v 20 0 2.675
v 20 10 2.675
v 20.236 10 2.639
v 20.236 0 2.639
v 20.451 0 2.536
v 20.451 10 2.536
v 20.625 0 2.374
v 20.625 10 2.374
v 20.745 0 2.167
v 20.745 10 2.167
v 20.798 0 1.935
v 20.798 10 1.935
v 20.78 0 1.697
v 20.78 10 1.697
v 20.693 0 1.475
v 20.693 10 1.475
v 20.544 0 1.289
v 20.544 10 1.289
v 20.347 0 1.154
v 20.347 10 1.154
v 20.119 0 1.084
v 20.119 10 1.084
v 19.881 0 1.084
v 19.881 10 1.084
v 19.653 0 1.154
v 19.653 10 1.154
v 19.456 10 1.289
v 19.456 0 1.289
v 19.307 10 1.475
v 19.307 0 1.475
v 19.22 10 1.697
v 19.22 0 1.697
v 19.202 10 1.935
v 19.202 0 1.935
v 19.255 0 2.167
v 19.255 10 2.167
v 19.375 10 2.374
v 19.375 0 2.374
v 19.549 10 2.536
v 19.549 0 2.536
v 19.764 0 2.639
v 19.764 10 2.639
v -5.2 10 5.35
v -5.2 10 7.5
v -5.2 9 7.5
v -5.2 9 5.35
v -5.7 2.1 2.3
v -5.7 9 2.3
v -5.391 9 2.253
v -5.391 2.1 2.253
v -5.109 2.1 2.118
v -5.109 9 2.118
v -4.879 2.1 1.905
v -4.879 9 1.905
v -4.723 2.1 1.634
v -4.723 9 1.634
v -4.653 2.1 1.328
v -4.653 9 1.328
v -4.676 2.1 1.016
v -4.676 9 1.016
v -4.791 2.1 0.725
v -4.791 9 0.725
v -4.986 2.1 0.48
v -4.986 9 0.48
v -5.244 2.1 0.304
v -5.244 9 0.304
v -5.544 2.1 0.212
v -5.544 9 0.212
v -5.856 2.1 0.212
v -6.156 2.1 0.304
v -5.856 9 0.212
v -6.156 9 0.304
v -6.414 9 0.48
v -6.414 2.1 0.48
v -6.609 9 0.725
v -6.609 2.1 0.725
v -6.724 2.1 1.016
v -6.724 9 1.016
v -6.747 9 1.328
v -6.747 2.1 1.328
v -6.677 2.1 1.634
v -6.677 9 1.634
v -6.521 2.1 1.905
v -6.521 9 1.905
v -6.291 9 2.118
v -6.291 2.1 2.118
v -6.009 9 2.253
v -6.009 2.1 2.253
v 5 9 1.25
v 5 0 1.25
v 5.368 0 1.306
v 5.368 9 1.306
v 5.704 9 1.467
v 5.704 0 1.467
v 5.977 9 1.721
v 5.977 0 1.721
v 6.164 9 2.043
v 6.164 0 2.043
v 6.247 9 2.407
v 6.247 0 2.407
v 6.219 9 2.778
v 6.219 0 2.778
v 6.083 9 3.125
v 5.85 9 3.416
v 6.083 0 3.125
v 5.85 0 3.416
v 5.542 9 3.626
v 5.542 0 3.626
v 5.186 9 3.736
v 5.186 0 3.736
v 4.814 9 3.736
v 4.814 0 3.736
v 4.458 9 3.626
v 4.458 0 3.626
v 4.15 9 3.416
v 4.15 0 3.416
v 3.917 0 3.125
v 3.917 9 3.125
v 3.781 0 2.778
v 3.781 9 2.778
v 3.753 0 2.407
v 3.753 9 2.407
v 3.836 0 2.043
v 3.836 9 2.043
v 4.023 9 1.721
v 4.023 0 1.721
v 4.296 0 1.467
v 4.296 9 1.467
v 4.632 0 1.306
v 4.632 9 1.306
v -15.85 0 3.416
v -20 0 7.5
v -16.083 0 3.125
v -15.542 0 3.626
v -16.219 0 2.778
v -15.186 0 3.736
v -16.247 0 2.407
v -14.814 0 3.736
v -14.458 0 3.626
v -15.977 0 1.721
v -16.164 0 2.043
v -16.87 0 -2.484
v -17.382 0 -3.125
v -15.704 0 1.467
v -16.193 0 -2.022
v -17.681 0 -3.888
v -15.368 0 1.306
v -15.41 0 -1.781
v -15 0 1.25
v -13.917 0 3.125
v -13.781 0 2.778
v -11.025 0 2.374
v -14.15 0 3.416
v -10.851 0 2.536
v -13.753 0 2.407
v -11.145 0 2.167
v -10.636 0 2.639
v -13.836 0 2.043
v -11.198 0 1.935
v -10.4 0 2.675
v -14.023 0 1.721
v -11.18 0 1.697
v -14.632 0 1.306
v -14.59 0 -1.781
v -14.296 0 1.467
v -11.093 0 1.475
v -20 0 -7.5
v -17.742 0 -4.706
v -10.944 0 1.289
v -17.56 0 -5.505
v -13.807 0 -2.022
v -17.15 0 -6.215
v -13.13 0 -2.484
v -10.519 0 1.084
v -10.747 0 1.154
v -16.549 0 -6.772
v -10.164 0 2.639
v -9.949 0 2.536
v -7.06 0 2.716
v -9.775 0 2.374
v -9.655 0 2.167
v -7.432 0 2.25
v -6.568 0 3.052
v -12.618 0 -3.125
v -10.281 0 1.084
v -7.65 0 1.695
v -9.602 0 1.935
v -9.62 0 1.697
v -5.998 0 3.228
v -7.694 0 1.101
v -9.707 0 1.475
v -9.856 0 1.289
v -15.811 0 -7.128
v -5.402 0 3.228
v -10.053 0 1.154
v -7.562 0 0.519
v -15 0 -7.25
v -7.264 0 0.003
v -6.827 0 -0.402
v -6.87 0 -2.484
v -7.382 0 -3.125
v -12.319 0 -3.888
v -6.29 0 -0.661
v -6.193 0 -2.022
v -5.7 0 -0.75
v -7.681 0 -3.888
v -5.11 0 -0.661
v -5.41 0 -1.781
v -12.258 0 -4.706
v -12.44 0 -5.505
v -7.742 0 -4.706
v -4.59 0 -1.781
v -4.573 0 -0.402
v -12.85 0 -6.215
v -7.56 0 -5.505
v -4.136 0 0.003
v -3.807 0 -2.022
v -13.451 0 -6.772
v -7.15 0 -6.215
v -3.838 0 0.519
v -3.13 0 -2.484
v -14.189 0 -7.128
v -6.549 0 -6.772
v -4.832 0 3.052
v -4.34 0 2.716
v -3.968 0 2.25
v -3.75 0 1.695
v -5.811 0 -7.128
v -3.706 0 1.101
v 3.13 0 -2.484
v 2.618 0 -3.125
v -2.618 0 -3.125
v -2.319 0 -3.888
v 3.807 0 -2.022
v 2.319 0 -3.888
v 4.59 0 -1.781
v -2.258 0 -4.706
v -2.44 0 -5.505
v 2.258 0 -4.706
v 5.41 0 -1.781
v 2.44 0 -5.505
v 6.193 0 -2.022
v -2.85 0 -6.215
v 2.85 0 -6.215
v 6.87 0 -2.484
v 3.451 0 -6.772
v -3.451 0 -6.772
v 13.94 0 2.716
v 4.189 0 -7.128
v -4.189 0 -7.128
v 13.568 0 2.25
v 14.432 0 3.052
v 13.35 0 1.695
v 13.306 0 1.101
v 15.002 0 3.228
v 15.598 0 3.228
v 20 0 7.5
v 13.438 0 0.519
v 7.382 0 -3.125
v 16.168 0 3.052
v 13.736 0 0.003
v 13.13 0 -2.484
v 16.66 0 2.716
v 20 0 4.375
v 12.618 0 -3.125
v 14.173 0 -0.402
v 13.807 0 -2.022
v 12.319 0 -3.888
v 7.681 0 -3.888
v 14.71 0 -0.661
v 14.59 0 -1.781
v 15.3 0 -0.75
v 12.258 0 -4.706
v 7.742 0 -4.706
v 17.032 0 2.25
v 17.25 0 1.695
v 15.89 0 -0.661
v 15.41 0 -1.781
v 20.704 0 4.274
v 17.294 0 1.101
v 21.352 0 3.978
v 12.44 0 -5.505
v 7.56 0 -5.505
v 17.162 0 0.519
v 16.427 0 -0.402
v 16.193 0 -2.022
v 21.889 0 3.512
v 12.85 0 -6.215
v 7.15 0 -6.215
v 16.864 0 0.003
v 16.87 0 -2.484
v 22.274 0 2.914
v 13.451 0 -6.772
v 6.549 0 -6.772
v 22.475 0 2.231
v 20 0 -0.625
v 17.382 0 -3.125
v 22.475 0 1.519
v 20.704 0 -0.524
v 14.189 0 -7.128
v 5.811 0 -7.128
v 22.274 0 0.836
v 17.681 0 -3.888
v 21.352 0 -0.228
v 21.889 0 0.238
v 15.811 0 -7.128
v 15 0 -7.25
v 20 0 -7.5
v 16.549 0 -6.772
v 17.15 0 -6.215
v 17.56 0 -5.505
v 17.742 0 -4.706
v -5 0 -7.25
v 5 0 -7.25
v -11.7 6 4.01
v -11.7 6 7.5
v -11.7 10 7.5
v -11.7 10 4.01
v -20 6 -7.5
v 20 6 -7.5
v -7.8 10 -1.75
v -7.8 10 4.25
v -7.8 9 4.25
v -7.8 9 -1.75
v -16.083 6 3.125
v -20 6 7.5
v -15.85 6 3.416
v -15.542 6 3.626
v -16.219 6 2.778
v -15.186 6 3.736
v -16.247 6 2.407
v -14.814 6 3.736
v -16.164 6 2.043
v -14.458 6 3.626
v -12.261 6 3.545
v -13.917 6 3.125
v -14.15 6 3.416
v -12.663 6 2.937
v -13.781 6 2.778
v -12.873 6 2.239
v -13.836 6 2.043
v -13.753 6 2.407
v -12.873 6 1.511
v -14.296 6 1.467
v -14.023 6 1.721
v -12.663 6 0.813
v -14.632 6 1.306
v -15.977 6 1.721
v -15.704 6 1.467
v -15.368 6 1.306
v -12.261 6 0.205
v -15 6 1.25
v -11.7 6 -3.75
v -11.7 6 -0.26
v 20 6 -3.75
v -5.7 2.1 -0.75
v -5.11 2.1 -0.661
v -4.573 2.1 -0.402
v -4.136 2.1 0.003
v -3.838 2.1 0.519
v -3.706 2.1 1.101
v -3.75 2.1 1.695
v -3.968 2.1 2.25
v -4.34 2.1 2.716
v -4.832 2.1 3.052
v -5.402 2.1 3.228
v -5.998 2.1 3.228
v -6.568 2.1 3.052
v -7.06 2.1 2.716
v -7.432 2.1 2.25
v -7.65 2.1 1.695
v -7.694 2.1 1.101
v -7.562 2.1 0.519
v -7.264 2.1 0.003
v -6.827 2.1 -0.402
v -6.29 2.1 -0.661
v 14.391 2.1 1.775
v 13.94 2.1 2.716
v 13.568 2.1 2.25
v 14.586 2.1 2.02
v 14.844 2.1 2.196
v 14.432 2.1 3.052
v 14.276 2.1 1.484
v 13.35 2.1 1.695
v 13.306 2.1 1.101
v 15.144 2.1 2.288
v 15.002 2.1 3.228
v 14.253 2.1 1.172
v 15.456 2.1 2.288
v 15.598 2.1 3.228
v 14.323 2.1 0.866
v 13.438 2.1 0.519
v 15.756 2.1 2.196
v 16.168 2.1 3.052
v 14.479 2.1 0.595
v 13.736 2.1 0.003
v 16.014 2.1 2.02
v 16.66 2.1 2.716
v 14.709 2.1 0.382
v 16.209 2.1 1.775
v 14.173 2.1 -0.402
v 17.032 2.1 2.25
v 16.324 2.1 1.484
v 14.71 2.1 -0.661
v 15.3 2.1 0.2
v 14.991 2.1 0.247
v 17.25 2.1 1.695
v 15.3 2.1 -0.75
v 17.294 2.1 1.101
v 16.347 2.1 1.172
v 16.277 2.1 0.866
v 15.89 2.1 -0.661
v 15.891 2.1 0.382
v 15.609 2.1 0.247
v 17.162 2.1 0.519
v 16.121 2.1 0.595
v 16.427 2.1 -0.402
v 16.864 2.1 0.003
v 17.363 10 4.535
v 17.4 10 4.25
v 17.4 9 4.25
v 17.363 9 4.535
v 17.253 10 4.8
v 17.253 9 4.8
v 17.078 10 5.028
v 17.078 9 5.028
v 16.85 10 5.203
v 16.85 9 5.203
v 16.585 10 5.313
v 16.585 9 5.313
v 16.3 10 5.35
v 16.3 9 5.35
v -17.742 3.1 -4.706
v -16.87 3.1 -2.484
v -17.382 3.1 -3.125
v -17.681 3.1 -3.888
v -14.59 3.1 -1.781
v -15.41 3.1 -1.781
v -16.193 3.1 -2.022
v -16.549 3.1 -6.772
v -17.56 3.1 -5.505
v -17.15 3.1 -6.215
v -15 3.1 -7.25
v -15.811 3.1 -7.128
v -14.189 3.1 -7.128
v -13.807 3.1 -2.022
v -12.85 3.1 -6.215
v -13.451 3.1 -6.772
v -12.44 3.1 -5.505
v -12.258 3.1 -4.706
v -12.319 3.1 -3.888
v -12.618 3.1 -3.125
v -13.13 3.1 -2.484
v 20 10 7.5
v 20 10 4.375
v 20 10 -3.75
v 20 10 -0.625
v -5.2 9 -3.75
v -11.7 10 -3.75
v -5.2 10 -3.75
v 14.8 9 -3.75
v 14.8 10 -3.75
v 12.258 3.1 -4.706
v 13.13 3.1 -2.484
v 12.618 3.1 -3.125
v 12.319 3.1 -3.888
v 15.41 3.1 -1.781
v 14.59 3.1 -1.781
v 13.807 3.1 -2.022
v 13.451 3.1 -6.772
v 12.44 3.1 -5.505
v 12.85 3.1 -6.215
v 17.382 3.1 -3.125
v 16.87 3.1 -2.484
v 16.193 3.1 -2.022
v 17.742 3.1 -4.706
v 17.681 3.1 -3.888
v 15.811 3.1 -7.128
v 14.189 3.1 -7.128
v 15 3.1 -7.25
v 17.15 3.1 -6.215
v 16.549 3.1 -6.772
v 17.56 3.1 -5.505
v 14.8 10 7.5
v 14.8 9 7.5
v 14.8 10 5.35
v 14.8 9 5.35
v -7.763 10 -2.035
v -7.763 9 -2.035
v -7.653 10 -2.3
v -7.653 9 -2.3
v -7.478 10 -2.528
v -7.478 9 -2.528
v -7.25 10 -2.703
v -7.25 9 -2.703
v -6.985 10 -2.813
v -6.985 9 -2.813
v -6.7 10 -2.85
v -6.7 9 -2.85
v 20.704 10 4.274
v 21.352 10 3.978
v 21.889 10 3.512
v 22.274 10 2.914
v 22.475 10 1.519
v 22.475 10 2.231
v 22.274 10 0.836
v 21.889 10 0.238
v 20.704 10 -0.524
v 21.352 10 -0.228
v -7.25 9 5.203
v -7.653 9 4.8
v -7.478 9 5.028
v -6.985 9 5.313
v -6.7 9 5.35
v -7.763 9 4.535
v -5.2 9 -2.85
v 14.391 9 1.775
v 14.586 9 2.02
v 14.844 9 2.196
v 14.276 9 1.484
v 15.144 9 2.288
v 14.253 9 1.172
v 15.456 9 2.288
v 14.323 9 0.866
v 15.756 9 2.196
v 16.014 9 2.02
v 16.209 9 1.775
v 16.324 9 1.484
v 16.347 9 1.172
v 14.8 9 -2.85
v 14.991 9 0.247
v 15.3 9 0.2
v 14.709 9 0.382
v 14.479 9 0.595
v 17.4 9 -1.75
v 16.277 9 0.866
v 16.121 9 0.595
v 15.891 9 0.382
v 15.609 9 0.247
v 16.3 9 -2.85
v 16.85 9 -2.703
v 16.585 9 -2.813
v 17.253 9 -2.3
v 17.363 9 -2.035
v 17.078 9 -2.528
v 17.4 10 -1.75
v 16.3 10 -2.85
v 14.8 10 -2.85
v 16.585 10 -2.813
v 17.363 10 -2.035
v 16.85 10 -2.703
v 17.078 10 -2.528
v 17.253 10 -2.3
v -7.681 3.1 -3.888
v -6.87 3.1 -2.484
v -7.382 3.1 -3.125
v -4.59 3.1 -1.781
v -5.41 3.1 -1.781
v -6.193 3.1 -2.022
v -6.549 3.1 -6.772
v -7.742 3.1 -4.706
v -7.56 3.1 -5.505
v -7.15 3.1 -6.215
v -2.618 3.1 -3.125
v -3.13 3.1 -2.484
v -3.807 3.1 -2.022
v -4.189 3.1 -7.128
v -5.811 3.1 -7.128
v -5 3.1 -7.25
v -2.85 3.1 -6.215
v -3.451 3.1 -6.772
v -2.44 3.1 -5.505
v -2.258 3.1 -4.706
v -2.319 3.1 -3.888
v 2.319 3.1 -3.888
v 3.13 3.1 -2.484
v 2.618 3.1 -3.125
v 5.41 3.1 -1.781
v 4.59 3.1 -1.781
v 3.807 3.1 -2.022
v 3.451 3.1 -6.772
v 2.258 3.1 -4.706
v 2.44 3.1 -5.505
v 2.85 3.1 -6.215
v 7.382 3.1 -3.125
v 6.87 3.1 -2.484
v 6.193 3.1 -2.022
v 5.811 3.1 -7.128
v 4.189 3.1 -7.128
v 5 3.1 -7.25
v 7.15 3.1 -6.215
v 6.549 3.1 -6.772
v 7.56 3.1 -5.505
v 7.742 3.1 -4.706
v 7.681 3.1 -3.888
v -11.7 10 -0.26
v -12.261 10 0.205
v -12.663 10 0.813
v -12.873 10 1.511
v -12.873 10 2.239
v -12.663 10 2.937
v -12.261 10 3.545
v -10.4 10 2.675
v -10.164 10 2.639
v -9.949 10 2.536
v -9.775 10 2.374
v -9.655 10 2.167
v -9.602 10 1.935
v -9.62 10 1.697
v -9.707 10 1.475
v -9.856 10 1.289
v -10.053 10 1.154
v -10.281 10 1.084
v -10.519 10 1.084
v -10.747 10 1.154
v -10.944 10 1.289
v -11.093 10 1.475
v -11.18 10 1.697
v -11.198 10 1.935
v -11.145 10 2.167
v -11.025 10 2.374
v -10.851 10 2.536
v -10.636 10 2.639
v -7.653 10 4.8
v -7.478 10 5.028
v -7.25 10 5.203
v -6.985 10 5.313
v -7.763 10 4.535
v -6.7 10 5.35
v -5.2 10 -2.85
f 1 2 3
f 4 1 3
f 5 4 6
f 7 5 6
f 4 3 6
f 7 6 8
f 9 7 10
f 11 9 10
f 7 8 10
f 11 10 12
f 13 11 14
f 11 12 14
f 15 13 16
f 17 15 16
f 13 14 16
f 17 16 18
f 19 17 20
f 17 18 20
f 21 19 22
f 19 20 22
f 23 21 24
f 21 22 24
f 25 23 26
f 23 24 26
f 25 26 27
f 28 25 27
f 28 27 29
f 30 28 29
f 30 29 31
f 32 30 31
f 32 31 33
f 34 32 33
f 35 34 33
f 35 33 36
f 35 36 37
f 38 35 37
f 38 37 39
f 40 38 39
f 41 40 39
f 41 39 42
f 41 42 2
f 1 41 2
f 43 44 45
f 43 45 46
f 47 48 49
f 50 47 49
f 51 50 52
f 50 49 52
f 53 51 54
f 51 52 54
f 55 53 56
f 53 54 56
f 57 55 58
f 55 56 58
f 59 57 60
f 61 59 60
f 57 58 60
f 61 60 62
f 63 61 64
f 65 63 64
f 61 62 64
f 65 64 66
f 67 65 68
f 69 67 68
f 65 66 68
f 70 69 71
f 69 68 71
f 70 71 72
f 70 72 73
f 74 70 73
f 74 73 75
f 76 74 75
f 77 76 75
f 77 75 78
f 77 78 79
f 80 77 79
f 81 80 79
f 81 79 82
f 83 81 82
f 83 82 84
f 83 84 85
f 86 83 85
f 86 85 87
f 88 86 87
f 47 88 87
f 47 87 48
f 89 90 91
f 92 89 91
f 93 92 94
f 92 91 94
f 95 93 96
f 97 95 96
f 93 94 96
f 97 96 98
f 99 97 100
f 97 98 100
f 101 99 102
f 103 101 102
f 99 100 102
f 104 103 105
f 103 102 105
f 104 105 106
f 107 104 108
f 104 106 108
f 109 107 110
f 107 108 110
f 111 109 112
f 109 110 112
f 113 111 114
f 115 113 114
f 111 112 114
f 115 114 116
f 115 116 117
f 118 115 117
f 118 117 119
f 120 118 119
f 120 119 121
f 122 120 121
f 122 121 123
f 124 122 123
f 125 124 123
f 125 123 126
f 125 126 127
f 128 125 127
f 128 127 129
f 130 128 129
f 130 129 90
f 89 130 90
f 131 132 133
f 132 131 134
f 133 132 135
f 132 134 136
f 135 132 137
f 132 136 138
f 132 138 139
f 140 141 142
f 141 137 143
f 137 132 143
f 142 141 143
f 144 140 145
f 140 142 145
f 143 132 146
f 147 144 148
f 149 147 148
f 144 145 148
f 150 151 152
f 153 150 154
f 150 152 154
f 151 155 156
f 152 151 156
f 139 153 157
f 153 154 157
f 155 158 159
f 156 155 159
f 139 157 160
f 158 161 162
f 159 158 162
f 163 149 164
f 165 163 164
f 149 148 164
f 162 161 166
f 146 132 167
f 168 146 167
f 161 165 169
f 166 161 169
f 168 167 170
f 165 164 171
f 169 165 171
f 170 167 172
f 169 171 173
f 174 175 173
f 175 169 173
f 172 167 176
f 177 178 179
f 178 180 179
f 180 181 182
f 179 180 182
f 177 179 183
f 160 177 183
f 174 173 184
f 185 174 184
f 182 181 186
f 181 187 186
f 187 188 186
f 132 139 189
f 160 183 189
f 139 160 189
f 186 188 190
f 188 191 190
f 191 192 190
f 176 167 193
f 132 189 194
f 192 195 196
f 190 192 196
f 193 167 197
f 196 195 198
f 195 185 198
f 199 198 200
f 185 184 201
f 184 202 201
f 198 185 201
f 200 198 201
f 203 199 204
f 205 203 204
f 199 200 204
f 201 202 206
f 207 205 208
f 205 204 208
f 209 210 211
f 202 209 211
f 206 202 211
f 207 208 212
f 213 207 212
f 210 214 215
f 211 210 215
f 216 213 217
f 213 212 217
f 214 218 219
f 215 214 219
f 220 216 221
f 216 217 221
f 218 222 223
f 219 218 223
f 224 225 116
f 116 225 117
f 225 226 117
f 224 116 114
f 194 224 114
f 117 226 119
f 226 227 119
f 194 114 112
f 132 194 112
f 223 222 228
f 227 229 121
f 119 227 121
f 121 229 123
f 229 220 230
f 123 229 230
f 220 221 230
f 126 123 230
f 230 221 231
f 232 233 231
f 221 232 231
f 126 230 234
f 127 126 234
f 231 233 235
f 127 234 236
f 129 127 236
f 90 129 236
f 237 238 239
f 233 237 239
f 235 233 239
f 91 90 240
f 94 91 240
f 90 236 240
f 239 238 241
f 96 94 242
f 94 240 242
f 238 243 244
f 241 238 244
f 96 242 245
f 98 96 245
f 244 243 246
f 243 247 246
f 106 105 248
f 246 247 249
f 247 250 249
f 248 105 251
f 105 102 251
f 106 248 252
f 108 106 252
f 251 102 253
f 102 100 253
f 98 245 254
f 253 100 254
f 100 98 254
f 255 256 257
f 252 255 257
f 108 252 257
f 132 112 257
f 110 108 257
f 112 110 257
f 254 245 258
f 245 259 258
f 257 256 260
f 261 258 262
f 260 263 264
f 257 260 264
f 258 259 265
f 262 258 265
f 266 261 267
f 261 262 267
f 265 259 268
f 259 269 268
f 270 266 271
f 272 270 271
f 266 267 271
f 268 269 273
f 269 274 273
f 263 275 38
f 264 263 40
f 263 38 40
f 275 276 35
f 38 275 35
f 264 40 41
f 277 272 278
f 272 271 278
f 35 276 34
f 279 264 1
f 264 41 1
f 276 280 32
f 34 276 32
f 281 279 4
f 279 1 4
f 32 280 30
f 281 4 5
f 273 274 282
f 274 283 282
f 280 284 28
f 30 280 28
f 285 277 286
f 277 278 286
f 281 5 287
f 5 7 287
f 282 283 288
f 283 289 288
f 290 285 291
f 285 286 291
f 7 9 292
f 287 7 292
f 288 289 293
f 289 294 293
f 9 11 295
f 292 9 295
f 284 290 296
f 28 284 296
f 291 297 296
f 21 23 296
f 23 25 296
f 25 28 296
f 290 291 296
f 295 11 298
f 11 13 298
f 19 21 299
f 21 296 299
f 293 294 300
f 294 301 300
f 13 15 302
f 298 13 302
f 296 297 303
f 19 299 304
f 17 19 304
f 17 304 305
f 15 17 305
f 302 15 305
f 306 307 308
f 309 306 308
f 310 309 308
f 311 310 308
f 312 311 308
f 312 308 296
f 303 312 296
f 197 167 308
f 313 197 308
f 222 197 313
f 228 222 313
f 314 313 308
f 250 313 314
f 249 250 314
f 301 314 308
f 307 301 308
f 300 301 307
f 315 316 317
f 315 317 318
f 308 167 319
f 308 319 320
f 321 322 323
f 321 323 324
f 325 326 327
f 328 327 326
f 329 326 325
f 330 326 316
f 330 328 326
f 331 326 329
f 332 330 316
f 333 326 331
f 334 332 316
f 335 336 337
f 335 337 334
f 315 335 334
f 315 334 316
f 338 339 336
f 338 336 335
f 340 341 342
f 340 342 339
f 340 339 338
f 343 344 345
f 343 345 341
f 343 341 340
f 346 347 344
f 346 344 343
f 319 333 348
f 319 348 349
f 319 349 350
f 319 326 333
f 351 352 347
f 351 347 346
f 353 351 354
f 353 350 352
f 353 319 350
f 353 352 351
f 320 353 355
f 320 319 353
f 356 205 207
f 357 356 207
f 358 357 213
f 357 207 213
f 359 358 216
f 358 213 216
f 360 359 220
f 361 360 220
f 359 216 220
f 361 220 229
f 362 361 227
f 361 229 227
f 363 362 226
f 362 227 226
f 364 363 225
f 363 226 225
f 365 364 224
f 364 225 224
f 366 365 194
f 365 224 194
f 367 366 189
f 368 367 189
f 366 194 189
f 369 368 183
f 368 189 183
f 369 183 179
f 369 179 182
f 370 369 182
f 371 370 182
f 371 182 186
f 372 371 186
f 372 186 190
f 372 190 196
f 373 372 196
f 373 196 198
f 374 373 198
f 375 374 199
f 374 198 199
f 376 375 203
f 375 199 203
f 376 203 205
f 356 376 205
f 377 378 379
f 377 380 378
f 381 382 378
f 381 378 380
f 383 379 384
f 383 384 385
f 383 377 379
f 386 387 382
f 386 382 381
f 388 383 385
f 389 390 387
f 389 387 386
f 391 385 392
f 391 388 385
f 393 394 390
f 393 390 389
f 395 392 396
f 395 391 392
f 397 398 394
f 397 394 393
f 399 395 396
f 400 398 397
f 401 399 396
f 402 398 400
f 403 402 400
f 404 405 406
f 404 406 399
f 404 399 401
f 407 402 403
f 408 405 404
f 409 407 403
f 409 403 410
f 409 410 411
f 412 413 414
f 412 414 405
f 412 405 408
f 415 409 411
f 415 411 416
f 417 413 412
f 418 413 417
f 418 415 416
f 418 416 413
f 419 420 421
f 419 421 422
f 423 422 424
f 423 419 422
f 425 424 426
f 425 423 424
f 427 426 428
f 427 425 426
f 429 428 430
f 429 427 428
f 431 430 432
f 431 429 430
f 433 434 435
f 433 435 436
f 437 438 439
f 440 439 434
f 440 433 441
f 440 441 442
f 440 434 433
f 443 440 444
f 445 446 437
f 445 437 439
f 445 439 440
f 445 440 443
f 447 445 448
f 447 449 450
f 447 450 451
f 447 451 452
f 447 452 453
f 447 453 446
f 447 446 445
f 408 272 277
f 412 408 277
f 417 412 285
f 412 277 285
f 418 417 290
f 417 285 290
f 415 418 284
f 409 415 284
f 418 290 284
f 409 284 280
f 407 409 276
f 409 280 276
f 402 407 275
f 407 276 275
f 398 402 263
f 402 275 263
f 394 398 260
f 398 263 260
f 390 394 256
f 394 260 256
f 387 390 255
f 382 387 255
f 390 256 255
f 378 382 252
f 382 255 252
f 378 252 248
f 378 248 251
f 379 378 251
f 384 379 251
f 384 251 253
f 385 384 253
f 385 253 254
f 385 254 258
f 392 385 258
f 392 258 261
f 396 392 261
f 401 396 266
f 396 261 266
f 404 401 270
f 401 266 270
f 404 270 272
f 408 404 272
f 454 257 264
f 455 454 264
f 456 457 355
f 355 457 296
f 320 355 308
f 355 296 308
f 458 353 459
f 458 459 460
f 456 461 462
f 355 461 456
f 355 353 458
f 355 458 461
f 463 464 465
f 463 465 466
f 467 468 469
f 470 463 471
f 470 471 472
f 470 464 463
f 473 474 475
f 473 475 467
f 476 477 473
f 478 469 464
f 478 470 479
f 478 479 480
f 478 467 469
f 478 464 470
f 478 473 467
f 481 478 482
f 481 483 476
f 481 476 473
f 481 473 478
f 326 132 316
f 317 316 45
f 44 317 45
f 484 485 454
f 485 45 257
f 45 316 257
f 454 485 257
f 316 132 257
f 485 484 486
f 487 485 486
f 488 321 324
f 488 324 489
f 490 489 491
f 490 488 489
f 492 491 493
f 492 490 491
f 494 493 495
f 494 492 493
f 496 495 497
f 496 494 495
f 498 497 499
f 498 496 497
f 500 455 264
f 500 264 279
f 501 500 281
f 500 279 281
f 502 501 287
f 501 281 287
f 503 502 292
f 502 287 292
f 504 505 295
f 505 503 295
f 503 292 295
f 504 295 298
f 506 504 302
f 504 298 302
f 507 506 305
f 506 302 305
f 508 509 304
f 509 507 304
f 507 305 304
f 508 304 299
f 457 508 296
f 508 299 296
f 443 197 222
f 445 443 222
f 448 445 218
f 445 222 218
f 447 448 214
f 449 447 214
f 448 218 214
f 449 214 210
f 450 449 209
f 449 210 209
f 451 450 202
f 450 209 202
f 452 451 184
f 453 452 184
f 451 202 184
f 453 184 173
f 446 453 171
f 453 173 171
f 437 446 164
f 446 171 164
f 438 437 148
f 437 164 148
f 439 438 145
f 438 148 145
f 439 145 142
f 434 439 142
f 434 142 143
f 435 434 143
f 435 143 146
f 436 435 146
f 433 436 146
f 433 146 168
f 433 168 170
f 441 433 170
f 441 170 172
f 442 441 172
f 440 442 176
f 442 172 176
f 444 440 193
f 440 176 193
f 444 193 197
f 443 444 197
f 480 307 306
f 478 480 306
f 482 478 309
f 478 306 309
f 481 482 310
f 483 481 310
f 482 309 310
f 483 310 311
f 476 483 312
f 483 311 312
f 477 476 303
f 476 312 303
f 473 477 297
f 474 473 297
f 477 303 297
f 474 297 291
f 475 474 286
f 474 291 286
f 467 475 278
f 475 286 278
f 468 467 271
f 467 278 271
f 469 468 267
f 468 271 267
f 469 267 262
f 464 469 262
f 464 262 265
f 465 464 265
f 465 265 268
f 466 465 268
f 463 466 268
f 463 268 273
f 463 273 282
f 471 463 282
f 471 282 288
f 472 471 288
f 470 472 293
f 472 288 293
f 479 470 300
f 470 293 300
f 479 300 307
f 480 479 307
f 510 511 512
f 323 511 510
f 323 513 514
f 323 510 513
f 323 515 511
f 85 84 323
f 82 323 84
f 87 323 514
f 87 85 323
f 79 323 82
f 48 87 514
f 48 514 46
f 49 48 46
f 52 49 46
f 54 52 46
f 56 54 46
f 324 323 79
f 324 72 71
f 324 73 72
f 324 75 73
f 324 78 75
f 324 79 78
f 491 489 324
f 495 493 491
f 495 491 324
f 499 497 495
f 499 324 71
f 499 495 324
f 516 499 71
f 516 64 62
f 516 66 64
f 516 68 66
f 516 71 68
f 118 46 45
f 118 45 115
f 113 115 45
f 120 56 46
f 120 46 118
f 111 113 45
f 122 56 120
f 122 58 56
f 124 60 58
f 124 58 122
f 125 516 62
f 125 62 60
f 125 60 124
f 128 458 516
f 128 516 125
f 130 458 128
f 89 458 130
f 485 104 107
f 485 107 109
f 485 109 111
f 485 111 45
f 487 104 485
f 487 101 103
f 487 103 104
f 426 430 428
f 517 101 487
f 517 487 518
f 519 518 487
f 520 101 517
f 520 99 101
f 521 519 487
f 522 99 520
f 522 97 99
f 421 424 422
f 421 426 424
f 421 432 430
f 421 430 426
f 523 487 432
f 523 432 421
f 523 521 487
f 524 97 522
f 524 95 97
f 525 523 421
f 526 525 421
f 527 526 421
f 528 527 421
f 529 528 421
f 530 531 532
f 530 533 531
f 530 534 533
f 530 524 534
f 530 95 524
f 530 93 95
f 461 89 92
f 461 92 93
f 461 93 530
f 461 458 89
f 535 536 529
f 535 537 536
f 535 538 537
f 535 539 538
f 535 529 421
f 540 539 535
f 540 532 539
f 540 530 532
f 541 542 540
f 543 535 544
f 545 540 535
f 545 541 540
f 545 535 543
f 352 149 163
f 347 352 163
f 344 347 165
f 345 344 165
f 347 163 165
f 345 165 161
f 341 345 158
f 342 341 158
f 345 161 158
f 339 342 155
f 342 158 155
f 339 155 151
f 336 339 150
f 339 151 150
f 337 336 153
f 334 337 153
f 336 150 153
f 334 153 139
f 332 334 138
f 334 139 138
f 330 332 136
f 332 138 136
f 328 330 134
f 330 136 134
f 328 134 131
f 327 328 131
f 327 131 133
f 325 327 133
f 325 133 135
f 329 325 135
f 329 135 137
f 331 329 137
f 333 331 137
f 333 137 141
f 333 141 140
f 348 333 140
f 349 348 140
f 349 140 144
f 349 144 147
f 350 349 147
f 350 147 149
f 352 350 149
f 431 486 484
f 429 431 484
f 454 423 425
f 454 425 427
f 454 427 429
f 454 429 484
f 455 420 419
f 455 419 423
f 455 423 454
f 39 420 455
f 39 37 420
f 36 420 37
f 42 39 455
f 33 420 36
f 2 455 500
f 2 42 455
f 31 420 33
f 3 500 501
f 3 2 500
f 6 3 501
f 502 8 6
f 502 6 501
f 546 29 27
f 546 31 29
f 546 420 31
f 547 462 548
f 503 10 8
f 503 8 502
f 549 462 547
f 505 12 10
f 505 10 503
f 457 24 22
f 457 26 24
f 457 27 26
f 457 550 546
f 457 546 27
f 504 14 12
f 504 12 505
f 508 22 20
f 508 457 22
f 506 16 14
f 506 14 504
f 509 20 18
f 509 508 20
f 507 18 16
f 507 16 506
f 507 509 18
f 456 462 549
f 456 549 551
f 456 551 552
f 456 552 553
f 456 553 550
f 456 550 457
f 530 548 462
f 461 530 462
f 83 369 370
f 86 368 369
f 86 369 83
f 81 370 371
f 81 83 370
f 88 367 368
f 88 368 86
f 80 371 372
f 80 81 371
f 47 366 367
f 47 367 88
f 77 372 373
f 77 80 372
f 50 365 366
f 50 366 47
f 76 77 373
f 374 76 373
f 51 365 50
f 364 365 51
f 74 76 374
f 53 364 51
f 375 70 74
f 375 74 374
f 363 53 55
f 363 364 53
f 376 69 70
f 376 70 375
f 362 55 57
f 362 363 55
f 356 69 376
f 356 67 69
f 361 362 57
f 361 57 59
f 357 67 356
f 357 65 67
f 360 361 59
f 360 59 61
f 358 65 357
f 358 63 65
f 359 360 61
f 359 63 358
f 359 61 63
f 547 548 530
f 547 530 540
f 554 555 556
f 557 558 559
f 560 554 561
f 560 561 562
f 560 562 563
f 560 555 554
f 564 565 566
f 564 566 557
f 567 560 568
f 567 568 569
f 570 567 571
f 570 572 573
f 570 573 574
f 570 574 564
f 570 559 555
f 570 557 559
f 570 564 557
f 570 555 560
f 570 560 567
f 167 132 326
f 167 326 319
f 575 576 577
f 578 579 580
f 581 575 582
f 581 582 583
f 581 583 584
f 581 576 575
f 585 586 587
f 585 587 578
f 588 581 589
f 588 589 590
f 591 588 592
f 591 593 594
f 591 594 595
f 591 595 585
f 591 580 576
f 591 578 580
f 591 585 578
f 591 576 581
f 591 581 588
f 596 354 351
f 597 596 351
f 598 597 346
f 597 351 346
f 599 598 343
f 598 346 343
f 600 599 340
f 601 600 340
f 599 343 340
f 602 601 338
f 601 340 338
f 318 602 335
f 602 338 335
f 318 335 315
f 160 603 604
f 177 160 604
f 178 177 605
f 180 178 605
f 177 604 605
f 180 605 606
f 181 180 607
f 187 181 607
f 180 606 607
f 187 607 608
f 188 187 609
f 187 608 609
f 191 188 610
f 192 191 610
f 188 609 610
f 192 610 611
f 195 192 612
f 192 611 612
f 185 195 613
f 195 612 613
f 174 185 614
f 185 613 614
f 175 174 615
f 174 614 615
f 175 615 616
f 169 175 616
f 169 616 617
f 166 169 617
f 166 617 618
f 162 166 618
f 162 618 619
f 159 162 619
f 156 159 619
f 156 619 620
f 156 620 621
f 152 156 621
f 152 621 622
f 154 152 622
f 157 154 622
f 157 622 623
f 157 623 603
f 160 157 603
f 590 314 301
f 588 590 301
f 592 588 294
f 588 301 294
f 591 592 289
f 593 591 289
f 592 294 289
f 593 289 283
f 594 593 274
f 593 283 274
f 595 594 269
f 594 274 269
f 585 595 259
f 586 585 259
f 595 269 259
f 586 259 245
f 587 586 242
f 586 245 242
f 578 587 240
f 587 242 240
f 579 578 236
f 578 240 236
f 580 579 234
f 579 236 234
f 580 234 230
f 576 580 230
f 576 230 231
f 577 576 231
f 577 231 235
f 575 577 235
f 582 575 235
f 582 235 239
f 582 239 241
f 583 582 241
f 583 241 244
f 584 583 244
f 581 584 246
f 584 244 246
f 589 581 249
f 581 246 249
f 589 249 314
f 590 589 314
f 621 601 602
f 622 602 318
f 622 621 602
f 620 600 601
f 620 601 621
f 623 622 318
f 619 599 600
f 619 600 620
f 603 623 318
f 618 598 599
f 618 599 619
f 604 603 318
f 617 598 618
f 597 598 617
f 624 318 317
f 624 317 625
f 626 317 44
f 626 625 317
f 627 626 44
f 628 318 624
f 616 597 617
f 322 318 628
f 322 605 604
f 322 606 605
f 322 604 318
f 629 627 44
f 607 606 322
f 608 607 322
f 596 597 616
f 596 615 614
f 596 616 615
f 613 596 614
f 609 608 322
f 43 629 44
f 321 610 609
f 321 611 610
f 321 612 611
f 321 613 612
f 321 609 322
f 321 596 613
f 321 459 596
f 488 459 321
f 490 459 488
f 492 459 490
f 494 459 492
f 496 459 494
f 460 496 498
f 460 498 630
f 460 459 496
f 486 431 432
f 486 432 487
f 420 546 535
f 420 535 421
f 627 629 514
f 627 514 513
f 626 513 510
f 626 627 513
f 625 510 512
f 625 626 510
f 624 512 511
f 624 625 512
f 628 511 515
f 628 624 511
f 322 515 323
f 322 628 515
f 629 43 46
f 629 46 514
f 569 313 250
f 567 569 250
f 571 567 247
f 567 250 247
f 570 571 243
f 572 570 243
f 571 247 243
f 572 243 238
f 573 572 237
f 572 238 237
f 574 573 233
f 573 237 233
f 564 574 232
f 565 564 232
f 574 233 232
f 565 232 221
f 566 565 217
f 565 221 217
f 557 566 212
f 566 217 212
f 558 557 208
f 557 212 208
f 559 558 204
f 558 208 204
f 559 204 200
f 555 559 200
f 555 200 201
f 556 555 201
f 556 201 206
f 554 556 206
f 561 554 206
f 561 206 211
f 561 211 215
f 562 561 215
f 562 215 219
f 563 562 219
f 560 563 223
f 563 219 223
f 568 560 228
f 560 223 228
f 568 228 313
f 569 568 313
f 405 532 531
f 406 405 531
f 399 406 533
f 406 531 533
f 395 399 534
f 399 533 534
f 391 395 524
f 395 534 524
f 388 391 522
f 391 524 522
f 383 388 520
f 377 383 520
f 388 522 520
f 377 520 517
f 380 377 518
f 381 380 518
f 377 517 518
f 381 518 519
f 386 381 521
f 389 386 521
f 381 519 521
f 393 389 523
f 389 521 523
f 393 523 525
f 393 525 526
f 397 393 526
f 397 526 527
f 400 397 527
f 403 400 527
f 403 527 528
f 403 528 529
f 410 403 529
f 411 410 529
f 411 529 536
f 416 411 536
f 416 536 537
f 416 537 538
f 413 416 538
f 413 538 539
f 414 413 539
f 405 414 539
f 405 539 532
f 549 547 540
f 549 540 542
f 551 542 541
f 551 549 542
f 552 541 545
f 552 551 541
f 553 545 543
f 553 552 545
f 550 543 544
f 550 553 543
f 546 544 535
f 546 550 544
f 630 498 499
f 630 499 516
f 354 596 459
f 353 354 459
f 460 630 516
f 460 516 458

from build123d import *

# Parameters (mm, degrees)
SKETCH_1_W          = 40
SKETCH_1_H          = 15
EXTRUDE_1_DEPTH     = 6
SKETCH_2_W          = 31.7
SKETCH_2_H          = 11.25
EXTRUDE_2_DEPTH     = 4
EXTRUDE_3_DEPTH     = 3
SKETCH_4_W          = 20
SKETCH_4_H          = 1
SKETCH_4_H_2        = 2.25
CUT_EXTRUDE_1_DEPTH = 1
SKETCH_6_R          = 1.05
CUT_EXTRUDE_2_DEPTH = 24.178653973
SKETCH_7_R          = 2
CUT_EXTRUDE_3_DEPTH = 2.1
SKETCH_8_R          = 1.25
CUT_EXTRUDE_4_DEPTH = 24.58495283
SKETCH_9_R          = 2.5
EXTRUDE_4_DEPTH     = 10
SKETCH_10_R         = 0.8
CUT_EXTRUDE_5_DEPTH = 26.739075352
CUT_EXTRUDE_6_DEPTH = 1
SKETCH_13_R         = 2.75
CUT_EXTRUDE_8_DEPTH = 3.1


with BuildPart() as part:
    # 草图1 → 凸台-拉伸1 (new body)
    with BuildSketch(Plane(origin=(0, 0, 0), x_dir=(1, 0, 0), z_dir=(0, 1, 0))):
        Rectangle(SKETCH_1_W, SKETCH_1_H)
    extrude(amount=EXTRUDE_1_DEPTH)

    # 草图2 → 凸台-拉伸2 (add)
    with BuildSketch(Plane(origin=(0, 6, 0), x_dir=(1, 0, 0), z_dir=(0, 1, 0))):
        with Locations((4.15, -1.875)):
            Rectangle(SKETCH_2_W, SKETCH_2_H)
        with BuildLine():
            Line((-6.7, 2.75), (16.3, 2.75))
            ThreePointArc((16.3, 2.75), (17.007106781, 2.457106781), (17.3, 1.75))
            Line((17.3, 1.75), (17.3, -4.25))
            ThreePointArc((17.3, -4.25), (17.007106781, -4.957106781), (16.3, -5.25))
            Line((16.3, -5.25), (-6.7, -5.25))
            ThreePointArc((-6.7, -5.25), (-7.407106781, -4.957106781), (-7.7, -4.25))
            Line((-7.7, -4.25), (-7.7, 1.75))
            ThreePointArc((-7.7, 1.75), (-7.407106781, 2.457106781), (-6.7, 2.75))
        make_face(mode=Mode.SUBTRACT)
    extrude(amount=EXTRUDE_2_DEPTH)

    # 草图3 → 凸台-拉伸3 (add)
    with BuildSketch(Plane(origin=(0, 6, 0), x_dir=(1, 0, 0), z_dir=(0, 1, 0))):
        with BuildLine():
            Line((-6.7, -5.25), (16.3, -5.25))
            ThreePointArc((16.3, -5.25), (17.007106781, -4.957106781), (17.3, -4.25))
            Line((17.3, -4.25), (17.3, 1.75))
            ThreePointArc((17.3, 1.75), (17.007106781, 2.457106781), (16.3, 2.75))
            Line((16.3, 2.75), (-6.7, 2.75))
            ThreePointArc((-6.7, 2.75), (-7.407106781, 2.457106781), (-7.7, 1.75))
            Line((-7.7, 1.75), (-7.7, -4.25))
            ThreePointArc((-7.7, -4.25), (-7.407106781, -4.957106781), (-6.7, -5.25))
        make_face()
    extrude(amount=EXTRUDE_3_DEPTH)

    # 草图4 → 切除-拉伸1 (cut)
    with BuildSketch(Plane(origin=(0, 10, 0), x_dir=(1, 0, 0), z_dir=(0, 1, 0))):
        with Locations((4.8, 3.25)):
            Rectangle(SKETCH_4_W, SKETCH_4_H)
        with Locations((4.8, -6.375)):
            Rectangle(SKETCH_4_W, SKETCH_4_H_2)
    extrude(amount=-CUT_EXTRUDE_1_DEPTH, mode=Mode.SUBTRACT)

    # 草图6 → 切除-拉伸2 (cut, through all)
    with BuildSketch(Plane(origin=(0, 9, 0), x_dir=(1, 0, 0), z_dir=(0, 1, 0))):
        with Locations(Location((-5.7, -1.25, 0), (0, 0, 270))):
            Circle(SKETCH_6_R)
        with Locations(Location((15.3, -1.25, 0), (0, 0, 90))):
            Circle(SKETCH_6_R)
    extrude(amount=-CUT_EXTRUDE_2_DEPTH, mode=Mode.SUBTRACT)

    # 草图7 → 切除-拉伸3 (cut)
    with BuildSketch(Plane.XZ):
        with Locations(Location((-5.7, 1.25, 0), (0, 0, 270))):
            Circle(SKETCH_7_R)
        with Locations(Location((15.3, 1.25, 0), (0, 0, 270))):
            Circle(SKETCH_7_R)
    extrude(amount=-CUT_EXTRUDE_3_DEPTH, mode=Mode.SUBTRACT)

    # 草图8 → 切除-拉伸4 (cut, through all)
    with BuildSketch(Plane.XZ):
        with Locations(Location((-15, 2.5, 0), (0, 0, 270))):
            Circle(SKETCH_8_R)
        with Locations(Location((5, 2.5, 0), (0, 0, 270))):
            Circle(SKETCH_8_R)
    extrude(amount=-CUT_EXTRUDE_4_DEPTH, mode=Mode.SUBTRACT)

    # 草图9 → 凸台-拉伸4 (add)
    with BuildSketch(Plane(origin=(0, 0, 0), x_dir=(1, 0, 0), z_dir=(0, 1, 0))):
        with Locations((20, -1.875)):
            Circle(SKETCH_9_R)
        with Locations((-10.4, -1.875)):
            Circle(SKETCH_9_R)
    extrude(amount=EXTRUDE_4_DEPTH)

    # 草图10 → 切除-拉伸5 (cut, through all)
    with BuildSketch(Plane(origin=(0, 10, 0), x_dir=(1, 0, 0), z_dir=(0, 1, 0))):
        with Locations(Location((-10.4, -1.875, 0), (0, 0, 270))):
            Circle(SKETCH_10_R)
        with Locations(Location((20, -1.875, 0), (0, 0, 270))):
            Circle(SKETCH_10_R)
    extrude(amount=-CUT_EXTRUDE_5_DEPTH, mode=Mode.SUBTRACT)

    # 草图11 → 切除-拉伸6 (cut)
    with BuildSketch(Plane(origin=(0, 10, 0), x_dir=(1, 0, 0), z_dir=(0, 1, 0))):
        with BuildLine():
            Line((17.4, 1.75), (17.4, -4.25))
            ThreePointArc((17.4, -4.25), (17.077817459, -5.027817459), (16.3, -5.35))
            Line((16.3, -5.35), (-6.7, -5.35))
            ThreePointArc((-6.7, -5.35), (-7.477817459, -5.027817459), (-7.8, -4.25))
            Line((-7.8, -4.25), (-7.8, 1.75))
            ThreePointArc((-7.8, 1.75), (-7.477817459, 2.527817459), (-6.7, 2.85))
            Line((-6.7, 2.85), (16.3, 2.85))
            ThreePointArc((16.3, 2.85), (17.077817459, 2.527817459), (17.4, 1.75))
        make_face()
    extrude(amount=-CUT_EXTRUDE_6_DEPTH, mode=Mode.SUBTRACT)

    # 草图13 → 切除-拉伸8 (cut)
    with BuildSketch(Plane.XZ):
        with Locations(Location((-15, -4.5, 0), (0, 0, 270))):
            Circle(SKETCH_13_R)
        with Locations(Location((-5, -4.5, 0), (0, 0, 270))):
            Circle(SKETCH_13_R)
        with Locations(Location((5, -4.5, 0), (0, 0, 270))):
            Circle(SKETCH_13_R)
        with Locations(Location((15, -4.5, 0), (0, 0, 270))):
            Circle(SKETCH_13_R)
    extrude(amount=-CUT_EXTRUDE_8_DEPTH, mode=Mode.SUBTRACT)


solid = part.part
